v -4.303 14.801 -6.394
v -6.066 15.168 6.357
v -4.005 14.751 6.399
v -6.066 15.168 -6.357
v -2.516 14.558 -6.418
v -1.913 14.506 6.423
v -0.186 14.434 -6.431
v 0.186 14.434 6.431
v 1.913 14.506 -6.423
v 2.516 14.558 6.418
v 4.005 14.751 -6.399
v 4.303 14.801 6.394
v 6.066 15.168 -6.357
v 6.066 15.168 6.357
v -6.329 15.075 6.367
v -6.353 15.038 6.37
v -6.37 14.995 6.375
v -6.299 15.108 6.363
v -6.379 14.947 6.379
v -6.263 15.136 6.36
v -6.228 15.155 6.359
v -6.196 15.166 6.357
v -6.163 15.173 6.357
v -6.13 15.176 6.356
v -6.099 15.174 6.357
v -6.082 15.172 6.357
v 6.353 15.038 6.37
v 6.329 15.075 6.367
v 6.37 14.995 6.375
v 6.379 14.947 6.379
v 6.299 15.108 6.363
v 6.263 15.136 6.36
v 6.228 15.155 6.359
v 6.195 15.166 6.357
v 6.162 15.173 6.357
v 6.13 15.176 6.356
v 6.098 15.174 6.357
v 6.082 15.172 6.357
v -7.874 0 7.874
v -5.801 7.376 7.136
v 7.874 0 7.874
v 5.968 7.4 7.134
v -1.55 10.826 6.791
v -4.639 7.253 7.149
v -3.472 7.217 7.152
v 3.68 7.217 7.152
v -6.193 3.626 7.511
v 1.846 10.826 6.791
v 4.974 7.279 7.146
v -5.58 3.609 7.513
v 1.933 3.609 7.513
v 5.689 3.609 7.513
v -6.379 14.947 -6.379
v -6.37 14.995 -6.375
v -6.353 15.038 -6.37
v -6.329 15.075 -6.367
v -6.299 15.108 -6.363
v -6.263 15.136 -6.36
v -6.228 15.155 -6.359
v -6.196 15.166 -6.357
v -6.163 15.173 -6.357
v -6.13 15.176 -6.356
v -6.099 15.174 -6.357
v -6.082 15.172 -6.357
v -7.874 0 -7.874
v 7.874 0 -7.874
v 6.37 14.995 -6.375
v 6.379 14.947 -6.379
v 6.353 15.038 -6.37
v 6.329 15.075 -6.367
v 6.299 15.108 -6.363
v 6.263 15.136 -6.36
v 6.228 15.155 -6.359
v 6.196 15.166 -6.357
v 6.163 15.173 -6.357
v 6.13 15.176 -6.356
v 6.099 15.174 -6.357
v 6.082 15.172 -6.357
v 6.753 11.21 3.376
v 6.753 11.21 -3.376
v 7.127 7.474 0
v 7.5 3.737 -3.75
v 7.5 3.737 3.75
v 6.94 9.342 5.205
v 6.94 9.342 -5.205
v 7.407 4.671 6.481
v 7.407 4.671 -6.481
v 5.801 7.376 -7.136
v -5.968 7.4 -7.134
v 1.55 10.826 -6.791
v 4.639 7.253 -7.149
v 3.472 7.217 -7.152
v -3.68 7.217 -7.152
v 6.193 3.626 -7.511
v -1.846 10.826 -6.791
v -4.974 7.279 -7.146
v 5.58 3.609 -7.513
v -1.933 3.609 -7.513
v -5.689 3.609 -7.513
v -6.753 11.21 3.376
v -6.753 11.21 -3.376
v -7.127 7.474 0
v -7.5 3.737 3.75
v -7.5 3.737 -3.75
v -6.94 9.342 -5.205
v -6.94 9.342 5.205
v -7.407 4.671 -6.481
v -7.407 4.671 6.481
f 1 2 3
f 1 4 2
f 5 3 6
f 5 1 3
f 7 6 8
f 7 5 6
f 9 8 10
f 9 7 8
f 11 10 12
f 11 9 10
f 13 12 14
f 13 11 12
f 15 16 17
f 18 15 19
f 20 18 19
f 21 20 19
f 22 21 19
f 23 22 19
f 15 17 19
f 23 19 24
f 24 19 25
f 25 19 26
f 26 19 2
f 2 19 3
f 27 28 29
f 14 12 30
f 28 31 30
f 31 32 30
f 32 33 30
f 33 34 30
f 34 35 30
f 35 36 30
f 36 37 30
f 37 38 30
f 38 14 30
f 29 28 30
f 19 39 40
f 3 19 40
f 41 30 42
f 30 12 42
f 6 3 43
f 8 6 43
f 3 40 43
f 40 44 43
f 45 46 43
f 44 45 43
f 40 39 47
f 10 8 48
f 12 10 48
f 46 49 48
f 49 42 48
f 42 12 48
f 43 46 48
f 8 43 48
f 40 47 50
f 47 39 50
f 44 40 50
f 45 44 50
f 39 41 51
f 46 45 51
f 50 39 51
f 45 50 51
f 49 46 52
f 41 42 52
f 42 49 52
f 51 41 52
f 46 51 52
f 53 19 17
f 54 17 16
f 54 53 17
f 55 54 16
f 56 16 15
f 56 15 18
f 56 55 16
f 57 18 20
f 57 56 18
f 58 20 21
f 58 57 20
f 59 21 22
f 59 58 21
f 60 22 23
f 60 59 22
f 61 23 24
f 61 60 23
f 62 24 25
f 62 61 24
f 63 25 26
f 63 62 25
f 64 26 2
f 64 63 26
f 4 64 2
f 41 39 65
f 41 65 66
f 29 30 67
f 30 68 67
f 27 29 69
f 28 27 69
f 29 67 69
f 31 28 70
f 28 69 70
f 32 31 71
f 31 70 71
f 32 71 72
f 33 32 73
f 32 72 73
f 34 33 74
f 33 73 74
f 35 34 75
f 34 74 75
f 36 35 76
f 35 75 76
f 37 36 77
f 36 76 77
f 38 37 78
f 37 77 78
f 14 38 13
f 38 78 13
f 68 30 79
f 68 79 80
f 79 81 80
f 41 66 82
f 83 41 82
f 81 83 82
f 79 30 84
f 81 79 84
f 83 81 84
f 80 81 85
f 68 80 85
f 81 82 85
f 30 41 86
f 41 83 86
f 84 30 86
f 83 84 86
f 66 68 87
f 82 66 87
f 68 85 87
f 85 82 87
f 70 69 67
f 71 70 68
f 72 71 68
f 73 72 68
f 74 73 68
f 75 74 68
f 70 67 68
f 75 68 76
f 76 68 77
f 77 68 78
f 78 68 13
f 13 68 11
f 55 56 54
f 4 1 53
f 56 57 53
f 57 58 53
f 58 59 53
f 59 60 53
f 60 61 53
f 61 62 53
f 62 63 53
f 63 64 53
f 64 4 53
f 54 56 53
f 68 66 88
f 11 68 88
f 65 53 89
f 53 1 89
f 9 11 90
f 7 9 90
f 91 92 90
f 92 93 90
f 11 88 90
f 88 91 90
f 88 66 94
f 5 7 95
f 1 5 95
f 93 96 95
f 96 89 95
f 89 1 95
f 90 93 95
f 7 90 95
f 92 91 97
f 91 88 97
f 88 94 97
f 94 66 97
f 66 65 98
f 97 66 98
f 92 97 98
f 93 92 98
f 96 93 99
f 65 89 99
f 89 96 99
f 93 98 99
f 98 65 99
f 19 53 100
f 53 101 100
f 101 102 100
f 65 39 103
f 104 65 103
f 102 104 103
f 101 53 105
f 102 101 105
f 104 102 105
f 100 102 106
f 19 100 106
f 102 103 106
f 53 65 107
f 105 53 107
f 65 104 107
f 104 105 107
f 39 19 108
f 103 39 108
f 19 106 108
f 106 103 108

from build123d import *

# Parameters (mm, degrees)
SKETCH2_W               = 12.7
SKETCH2_H               = 12.7
SKETCH1_W               = 15.748
SKETCH1_H               = 15.748
CUT_EXTRUDE1_DEPTH      = 8.8740001
CUT_EXTRUDE1_DEPTH_BACK = 8.8740001
FILLET1_R               = 0.254


with BuildPart() as part:
    # Sketch2 → Loft1 section 0
    with BuildSketch(Plane(origin=(0, 15.24, 0), x_dir=(1, 0, 0), z_dir=(0, 1, 0))):
        Rectangle(SKETCH2_W, SKETCH2_H)
    # Sketch1 → Loft1 section 1
    with BuildSketch(Plane(origin=(0, 0, 0), x_dir=(1, 0, 0), z_dir=(0, 1, 0))):
        Rectangle(SKETCH1_W, SKETCH1_H)
    loft()

    # Sketch3 → Cut-Extrude1 (cut, two sides)
    with BuildSketch(Plane.XY) as cut_extrude1_sk:
        with BuildLine():
            Line((-56.40168157, 28.163288611), (-6.35, 15.24))
            ThreePointArc((-6.35, 15.24), (0, 14.433444248), (6.35, 15.24))
            Line((6.35, 15.24), (56.40168157, 28.163288611))
            Line((56.40168157, 28.163288611), (56.40168157, 131.549597501))
            Line((56.40168157, 131.549597501), (-56.40168157, 131.549597501))
            Line((-56.40168157, 131.549597501), (-56.40168157, 28.163288611))
        make_face()
    extrude(amount=CUT_EXTRUDE1_DEPTH, mode=Mode.SUBTRACT)
    extrude(cut_extrude1_sk.sketch, amount=-CUT_EXTRUDE1_DEPTH_BACK, mode=Mode.SUBTRACT)

    # Fillet1
    fillet1_edges = [part.edges().sort_by_distance(p)[0] for p in [
        (6.35, 15.24, 0),
        (-6.35, 15.24, 0),
    ]]
    fillet(fillet1_edges, radius=FILLET1_R)


solid = part.part
